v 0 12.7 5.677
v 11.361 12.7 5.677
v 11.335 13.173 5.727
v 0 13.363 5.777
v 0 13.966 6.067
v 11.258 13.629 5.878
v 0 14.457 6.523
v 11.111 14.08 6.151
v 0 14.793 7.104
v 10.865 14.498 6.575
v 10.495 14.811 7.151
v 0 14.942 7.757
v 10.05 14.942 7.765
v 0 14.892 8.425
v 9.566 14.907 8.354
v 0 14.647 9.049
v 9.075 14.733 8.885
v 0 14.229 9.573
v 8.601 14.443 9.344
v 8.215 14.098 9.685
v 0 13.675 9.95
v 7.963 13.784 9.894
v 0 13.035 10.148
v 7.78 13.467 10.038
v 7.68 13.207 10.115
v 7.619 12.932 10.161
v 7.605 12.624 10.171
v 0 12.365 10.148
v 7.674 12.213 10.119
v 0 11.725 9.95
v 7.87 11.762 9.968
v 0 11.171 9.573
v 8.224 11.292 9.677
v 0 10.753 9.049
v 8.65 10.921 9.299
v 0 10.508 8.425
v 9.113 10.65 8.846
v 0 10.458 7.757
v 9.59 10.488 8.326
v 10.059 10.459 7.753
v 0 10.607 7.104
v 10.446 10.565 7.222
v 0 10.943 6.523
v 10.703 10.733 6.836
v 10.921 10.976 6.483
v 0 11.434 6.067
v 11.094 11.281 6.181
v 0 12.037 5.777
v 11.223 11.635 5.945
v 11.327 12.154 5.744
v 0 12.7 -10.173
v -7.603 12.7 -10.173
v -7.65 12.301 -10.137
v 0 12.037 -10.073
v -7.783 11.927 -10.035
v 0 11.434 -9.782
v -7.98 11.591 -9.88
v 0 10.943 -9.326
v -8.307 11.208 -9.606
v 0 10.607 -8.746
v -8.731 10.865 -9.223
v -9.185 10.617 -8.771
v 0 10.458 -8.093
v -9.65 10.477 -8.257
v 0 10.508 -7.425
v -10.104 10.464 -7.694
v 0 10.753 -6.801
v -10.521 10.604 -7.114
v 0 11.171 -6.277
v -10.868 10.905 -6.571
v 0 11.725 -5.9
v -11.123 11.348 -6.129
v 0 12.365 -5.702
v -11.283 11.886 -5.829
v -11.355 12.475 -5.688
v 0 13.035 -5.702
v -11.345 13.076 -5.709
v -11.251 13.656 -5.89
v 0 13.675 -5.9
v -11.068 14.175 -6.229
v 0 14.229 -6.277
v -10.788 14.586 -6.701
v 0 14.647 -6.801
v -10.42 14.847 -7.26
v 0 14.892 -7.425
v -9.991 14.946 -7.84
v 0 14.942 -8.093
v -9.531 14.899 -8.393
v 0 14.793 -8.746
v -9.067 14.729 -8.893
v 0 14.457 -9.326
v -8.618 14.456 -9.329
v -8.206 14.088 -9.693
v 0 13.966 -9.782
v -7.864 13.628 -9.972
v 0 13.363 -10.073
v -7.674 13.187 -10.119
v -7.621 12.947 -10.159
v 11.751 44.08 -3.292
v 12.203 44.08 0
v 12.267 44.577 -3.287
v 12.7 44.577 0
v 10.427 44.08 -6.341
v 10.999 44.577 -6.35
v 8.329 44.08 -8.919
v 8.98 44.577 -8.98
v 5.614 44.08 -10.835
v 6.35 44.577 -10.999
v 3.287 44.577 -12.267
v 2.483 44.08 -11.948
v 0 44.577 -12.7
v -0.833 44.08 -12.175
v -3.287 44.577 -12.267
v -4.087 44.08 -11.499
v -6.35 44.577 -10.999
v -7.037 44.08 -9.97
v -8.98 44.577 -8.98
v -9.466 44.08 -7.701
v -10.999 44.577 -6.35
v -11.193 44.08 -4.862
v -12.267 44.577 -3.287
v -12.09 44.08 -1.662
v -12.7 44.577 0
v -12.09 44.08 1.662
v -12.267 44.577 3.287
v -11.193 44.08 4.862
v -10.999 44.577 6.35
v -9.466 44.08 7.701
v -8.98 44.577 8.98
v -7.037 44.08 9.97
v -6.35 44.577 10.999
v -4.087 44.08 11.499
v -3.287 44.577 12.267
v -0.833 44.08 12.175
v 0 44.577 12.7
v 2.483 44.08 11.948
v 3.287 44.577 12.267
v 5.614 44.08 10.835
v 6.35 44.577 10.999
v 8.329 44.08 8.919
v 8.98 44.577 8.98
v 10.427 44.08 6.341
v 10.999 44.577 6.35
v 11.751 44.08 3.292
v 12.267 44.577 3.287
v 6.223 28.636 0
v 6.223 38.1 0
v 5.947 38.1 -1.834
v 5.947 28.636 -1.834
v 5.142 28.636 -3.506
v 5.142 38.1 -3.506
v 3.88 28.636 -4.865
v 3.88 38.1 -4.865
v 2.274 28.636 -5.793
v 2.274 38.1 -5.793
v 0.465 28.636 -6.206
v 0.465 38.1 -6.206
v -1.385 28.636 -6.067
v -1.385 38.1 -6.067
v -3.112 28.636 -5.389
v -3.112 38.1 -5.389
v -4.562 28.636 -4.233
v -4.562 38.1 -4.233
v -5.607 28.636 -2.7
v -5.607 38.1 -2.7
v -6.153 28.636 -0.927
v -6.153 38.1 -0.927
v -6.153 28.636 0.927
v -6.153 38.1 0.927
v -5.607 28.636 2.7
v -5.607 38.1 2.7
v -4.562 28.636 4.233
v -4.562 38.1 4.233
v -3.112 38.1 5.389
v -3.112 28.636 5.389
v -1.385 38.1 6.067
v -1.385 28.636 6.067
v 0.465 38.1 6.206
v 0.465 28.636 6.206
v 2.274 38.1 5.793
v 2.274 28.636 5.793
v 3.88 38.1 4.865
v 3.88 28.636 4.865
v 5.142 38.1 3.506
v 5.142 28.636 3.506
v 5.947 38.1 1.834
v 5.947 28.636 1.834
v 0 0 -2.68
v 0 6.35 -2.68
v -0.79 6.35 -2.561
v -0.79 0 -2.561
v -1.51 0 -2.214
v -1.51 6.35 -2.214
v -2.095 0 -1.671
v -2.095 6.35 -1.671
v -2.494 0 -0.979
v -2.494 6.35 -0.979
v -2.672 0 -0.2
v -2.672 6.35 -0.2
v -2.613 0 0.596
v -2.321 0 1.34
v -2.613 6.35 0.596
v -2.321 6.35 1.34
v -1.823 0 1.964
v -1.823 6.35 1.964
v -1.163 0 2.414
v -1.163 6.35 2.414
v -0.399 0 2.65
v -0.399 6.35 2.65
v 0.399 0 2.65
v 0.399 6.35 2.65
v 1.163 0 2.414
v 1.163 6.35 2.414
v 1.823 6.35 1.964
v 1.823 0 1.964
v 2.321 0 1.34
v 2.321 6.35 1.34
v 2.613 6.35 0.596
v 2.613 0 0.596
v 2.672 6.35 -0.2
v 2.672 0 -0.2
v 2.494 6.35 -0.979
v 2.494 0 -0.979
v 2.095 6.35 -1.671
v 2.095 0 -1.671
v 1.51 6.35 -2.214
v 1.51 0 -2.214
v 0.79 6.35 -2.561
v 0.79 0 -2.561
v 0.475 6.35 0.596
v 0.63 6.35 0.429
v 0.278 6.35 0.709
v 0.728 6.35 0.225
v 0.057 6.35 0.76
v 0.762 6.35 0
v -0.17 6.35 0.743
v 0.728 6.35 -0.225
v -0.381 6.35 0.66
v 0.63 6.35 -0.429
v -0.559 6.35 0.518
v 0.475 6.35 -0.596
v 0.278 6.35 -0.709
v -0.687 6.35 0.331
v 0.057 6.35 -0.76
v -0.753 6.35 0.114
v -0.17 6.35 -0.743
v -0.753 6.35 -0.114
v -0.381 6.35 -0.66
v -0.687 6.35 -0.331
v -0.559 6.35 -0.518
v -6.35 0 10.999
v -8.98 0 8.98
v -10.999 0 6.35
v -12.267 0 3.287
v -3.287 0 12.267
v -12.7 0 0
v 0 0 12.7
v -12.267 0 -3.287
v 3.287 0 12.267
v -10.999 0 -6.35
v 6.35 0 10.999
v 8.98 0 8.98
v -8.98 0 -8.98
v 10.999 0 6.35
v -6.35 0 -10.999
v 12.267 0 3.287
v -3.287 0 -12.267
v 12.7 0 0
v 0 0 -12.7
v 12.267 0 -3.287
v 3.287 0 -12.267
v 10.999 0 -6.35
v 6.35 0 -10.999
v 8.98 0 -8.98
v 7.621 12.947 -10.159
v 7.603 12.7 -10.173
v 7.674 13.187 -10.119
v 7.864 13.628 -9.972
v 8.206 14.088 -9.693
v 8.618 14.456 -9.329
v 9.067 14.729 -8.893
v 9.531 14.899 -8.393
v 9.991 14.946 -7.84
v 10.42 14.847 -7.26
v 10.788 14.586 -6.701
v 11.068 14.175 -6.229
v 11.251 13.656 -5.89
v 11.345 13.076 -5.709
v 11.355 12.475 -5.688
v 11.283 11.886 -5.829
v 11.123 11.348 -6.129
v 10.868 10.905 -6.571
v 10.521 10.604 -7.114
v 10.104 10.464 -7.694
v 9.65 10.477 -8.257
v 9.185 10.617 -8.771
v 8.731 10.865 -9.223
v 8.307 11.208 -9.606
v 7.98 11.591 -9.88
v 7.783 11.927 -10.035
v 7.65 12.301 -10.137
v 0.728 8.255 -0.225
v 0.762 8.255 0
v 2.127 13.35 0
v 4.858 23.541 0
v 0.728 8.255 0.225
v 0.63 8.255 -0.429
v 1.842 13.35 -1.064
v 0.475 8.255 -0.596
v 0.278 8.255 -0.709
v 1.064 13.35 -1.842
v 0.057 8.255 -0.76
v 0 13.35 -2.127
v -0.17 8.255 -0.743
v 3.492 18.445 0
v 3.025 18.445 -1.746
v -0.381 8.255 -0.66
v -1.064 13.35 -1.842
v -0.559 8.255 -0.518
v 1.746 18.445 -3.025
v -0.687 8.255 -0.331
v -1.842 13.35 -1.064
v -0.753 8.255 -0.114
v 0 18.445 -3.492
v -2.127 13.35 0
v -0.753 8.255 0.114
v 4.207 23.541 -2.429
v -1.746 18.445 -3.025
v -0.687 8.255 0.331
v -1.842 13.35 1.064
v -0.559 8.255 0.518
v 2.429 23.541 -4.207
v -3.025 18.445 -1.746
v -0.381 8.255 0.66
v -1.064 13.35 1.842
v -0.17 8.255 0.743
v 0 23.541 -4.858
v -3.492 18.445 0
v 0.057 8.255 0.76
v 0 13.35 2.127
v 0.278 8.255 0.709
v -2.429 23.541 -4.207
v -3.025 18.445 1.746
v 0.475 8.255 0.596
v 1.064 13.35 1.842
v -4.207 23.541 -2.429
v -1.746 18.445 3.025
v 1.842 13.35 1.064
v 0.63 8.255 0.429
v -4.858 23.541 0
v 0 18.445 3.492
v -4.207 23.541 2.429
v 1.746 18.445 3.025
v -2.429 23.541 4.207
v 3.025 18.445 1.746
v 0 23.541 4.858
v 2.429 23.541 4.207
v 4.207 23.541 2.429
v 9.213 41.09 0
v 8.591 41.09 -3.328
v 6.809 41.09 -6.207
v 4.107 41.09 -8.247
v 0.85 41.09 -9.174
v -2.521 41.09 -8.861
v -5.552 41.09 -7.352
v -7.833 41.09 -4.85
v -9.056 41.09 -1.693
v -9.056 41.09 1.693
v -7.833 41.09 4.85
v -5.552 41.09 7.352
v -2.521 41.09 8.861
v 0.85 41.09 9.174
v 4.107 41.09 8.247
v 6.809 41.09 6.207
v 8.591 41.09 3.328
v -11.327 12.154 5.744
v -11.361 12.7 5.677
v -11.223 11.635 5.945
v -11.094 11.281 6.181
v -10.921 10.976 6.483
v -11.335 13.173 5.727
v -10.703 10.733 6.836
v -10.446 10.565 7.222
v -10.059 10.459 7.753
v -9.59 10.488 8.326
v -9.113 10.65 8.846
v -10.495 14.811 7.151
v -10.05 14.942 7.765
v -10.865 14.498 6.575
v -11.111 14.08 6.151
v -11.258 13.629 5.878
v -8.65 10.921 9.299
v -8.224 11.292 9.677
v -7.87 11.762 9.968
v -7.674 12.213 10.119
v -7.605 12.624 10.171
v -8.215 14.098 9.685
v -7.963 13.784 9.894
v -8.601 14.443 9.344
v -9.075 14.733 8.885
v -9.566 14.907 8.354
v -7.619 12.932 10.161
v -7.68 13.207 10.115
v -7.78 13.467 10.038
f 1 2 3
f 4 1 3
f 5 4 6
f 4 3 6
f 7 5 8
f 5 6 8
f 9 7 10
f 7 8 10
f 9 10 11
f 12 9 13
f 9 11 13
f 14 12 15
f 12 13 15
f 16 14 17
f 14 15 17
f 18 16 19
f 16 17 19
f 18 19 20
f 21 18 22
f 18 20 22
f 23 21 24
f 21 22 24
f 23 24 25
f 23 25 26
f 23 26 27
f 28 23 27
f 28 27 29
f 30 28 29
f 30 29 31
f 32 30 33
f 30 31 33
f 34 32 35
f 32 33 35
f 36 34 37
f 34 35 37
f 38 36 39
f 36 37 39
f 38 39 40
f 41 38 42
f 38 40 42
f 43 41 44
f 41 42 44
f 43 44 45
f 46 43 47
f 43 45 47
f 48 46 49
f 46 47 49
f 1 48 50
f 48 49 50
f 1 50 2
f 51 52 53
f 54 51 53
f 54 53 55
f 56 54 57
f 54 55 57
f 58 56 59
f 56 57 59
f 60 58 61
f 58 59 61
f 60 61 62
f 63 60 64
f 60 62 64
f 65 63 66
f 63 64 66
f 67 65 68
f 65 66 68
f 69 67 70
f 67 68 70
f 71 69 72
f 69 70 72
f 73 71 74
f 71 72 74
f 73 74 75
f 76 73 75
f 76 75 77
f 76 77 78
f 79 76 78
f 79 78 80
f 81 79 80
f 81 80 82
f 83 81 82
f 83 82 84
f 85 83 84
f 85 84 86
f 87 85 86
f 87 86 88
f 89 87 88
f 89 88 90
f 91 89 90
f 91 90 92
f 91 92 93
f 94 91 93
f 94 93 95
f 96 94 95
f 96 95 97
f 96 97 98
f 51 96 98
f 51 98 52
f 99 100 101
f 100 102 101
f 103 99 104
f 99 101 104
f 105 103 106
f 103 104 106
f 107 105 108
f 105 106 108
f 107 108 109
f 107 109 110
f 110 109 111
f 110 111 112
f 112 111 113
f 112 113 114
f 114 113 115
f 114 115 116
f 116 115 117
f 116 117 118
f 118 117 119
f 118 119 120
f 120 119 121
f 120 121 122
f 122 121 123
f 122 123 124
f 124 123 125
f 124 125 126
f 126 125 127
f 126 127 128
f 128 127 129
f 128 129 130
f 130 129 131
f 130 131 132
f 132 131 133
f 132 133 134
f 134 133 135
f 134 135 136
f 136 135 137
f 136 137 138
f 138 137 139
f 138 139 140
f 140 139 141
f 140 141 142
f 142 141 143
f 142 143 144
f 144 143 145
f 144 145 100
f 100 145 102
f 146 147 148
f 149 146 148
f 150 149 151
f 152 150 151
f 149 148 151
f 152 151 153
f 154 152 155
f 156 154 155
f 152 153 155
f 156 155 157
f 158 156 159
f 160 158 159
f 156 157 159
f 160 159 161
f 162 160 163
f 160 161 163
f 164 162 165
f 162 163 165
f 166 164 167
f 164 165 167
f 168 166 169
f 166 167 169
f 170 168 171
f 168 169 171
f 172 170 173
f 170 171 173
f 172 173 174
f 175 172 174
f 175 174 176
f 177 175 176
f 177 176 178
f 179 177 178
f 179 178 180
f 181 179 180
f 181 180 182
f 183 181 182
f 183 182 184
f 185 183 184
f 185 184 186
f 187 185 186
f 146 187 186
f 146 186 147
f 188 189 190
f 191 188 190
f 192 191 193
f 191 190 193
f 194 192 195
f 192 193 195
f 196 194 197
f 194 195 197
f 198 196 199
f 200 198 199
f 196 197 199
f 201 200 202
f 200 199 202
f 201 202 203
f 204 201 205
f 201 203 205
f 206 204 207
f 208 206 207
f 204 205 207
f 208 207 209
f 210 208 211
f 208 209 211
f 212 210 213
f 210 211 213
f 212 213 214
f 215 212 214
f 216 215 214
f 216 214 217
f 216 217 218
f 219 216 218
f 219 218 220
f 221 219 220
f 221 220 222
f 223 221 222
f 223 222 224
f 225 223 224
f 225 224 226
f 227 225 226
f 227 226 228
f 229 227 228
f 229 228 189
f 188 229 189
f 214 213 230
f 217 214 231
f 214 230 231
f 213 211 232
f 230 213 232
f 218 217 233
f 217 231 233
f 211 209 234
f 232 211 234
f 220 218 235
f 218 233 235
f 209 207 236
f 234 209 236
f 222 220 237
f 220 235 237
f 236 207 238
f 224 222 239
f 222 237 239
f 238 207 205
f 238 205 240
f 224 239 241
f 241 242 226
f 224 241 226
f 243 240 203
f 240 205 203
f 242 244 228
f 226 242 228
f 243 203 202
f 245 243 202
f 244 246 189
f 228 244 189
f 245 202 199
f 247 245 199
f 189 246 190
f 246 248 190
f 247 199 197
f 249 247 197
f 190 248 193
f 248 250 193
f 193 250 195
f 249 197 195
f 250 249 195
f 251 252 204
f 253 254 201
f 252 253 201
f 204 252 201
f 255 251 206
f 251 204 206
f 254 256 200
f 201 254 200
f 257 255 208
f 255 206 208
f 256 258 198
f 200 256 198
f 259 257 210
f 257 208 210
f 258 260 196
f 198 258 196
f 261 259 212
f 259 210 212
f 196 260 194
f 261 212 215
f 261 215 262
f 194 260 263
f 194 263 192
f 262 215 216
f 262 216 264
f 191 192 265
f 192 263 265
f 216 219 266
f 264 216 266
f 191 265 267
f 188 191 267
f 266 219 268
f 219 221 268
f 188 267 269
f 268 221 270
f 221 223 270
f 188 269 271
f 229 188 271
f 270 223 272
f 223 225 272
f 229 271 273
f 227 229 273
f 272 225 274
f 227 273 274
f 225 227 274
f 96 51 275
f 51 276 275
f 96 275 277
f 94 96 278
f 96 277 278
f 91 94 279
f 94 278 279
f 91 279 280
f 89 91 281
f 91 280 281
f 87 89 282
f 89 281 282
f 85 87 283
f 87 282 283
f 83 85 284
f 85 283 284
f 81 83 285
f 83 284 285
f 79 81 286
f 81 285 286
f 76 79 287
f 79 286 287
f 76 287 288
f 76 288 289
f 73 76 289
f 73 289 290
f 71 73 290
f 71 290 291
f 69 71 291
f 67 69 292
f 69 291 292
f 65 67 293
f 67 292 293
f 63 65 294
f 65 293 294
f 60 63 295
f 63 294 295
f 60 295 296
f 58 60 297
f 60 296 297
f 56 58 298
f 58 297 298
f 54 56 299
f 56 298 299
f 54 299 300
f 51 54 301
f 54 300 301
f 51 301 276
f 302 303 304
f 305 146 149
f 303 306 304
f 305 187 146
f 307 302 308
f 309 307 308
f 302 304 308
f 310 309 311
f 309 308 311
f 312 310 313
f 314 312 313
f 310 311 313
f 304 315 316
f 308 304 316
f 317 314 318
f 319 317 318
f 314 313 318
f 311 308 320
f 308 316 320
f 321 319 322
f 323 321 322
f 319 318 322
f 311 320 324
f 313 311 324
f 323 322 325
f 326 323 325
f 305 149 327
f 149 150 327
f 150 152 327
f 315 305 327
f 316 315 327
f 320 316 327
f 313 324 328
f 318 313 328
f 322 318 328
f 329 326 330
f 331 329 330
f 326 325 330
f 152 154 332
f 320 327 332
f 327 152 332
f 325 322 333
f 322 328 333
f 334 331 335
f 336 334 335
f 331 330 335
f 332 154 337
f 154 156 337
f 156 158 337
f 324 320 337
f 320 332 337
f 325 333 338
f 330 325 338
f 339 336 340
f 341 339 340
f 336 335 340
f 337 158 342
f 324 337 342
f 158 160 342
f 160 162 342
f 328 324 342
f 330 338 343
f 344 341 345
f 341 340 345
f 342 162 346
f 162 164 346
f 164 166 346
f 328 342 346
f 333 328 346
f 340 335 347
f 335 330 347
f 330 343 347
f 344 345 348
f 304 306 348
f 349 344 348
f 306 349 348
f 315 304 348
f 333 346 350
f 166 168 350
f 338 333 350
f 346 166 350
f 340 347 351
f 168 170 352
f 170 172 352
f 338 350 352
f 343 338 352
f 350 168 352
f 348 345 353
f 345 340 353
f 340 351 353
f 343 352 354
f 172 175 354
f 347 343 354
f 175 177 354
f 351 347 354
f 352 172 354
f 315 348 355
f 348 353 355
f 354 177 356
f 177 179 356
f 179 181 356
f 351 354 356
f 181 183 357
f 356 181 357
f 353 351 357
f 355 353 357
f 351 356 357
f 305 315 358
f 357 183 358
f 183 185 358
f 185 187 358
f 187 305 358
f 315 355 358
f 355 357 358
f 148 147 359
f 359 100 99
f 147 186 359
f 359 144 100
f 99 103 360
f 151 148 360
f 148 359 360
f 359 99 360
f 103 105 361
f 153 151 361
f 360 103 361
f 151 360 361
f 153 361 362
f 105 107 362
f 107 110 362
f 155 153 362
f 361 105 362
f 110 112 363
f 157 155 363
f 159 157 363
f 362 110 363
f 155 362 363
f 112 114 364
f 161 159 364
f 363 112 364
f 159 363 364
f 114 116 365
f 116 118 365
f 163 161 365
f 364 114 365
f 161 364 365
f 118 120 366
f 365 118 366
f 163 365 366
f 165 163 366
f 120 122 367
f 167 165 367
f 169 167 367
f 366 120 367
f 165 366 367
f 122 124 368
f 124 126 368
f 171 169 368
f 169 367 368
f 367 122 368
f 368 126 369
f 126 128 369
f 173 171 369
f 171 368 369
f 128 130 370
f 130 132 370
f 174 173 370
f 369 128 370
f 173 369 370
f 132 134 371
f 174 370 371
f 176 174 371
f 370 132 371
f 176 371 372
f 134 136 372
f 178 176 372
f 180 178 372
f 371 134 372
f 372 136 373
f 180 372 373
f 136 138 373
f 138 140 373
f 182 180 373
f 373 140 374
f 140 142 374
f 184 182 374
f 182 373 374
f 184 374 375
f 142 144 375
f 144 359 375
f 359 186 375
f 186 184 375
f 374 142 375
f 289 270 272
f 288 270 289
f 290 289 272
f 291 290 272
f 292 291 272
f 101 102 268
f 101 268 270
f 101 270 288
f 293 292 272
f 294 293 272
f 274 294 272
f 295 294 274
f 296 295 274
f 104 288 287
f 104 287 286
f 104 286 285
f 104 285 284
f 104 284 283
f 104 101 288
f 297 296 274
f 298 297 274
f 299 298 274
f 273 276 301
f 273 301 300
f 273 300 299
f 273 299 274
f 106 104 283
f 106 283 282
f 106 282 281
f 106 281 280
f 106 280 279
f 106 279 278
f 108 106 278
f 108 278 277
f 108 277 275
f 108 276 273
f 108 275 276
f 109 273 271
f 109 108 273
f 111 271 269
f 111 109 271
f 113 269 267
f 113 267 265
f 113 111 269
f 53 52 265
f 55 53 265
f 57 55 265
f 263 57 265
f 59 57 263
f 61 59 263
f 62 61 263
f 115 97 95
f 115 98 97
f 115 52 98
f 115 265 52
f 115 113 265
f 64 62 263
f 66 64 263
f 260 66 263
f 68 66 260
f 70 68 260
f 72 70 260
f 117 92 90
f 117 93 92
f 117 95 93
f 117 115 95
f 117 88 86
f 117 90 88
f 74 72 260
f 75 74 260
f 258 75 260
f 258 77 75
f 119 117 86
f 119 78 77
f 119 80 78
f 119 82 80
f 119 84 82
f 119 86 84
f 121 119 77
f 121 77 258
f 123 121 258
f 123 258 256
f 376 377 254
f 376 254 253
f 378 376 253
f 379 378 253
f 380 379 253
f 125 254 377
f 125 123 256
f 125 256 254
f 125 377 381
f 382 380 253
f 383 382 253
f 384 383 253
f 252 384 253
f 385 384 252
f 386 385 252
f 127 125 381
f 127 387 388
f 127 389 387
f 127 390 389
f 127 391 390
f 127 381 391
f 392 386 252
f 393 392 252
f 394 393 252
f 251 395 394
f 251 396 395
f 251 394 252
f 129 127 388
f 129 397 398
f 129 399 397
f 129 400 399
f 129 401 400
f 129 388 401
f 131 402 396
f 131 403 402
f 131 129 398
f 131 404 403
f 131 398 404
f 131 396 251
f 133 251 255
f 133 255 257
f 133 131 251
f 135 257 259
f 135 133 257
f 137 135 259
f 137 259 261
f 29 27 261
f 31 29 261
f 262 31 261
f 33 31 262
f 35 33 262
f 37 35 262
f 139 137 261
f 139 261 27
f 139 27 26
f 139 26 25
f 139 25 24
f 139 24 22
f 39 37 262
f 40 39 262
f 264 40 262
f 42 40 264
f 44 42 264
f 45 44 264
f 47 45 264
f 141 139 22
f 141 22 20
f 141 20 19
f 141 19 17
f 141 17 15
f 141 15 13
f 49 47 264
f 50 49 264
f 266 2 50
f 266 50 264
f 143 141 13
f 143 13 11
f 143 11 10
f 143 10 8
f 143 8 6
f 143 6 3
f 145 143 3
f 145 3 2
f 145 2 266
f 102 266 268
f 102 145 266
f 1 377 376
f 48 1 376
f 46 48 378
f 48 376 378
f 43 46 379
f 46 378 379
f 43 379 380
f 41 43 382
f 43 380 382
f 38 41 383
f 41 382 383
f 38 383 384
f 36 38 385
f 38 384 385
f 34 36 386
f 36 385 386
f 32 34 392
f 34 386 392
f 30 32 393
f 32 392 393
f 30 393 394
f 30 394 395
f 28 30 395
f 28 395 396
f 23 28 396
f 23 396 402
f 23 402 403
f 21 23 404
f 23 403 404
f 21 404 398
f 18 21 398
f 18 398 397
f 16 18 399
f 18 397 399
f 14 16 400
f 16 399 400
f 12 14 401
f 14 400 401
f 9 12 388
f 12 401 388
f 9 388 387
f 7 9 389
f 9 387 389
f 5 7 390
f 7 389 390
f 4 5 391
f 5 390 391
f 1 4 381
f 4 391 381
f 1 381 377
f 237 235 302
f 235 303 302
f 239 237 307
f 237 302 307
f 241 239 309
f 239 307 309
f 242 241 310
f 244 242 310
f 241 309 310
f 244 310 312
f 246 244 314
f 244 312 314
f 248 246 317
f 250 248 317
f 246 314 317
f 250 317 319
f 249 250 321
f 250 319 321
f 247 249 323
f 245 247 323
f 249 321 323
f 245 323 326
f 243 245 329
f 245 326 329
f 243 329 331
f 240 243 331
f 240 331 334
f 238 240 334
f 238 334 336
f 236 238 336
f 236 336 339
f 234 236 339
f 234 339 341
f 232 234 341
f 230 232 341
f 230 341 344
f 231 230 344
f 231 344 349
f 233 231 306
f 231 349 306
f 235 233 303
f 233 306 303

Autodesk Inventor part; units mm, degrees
ref_plane "YZ Plane" through (0, 0, 0) normal (1, 0, 0) x (0, 1, 0)
ref_plane "XZ Plane" through (0, 0, 0) normal (0, 1, 0) x (-1, 0, 0)
ref_plane "XY Plane" through (0, 0, 0) normal (0, 0, 1) x (1, 0, 0)
sketch "Sketch1" plane through (0, 0, 0) normal (0, 0, 1) x (1, 0, 0)
  line L0 (0, 0) -> (6.223, 0)
  line L1 (0, 0) -> (6.223, 0) construction
  line L2 (6.223, 0) -> (6.223, 38.1)
  line L3 (0, 0) -> (0.762, 0)
  line L4 (0.762, 0) -> (0.762, 8.255)
  line L5 (0.762, 8.255) -> (6.223, 28.6357)
  line L6 (6.223, 28.6357) -> (6.223, 38.1)
  line L7 (0, 0) -> (12.7, 0)
  line L8 (0, -8.9154) -> (0, 53.4924) projected
  line L9 (6.223, 38.1) -> (12.2033, 44.0803)
  line L10 (6.223, 38.1) -> (14.6805, 38.1) construction
  line L11 (12.2033, 44.0803) -> (12.7, 0)
  line L12 (12.7, 0) -> (12.7, 44.577)
  line L13 (12.7, 44.577) -> (6.223, 38.1)
  dimension "d0" = 6.223
  dimension "d1" = 0
  dimension "d2" = 38.1
  dimension "d3" = 90
  dimension "d4" = 0.762
  dimension "d5" = 8.255
  dimension "d6" = 165
  dimension "d7" = 12.7
  dimension "d18" = 45
revolve "Revolution1" add sketch "Sketch1" angle 360 about axis through (0, -10, 0) along (0, 1, 0)
sketch "Sketch3" plane through (0, 0, 0) normal (0, -1, 0) x (1, 0, 0)
  point P0 (0, 0)
  point P1 (0, 0)
hole "Hole2" at (0, 0, 0) direction (0, 1, 0) diameter 5.3594 depth 6.35 thread size "1/4-28 UNF" class "2B" standard "ANSI Unified Screw Threads"
sketch "Sketch4" plane through (0, 0, 0) normal (1, 0, 0) x (0, 1, 0)
  line L0 (0, 12.7) -> (0, -12.7) projected
  line L1 (0, 12.7) -> (0, 7.9248)
  line L2 (0, 7.9248) -> (12.7, 7.9248)
  line L3 (0, -12.7) -> (0, -7.9248)
  line L4 (0, -7.9248) -> (12.7, -7.9248)
  point P0 (0, 0)
  dimension "d28" = 4.7752
  dimension "d29" = 12.7
  dimension "d30" = 4.7752
  dimension "d31" = 12.7
  dimension "d32" = 90
hole "Hole3" at (0, 12.7, 7.9248) at (0, 12.7, -7.9248) direction (-1, 0, 0) diameter 4.4958 end through all clearance for "Socket Head Cap Screw" size "#8" standard "Ansi Unified Screw Threads"
mirror "Mirror1" about plane through (0, 0, 0) normal (1, 0, 0) of "Hole3"
equation "\"d47\" = 55deg"
equation "\"Sketch5_Pitch\" = 0.90714"
properties part number "catch vertical seal-tighttol-thread"
